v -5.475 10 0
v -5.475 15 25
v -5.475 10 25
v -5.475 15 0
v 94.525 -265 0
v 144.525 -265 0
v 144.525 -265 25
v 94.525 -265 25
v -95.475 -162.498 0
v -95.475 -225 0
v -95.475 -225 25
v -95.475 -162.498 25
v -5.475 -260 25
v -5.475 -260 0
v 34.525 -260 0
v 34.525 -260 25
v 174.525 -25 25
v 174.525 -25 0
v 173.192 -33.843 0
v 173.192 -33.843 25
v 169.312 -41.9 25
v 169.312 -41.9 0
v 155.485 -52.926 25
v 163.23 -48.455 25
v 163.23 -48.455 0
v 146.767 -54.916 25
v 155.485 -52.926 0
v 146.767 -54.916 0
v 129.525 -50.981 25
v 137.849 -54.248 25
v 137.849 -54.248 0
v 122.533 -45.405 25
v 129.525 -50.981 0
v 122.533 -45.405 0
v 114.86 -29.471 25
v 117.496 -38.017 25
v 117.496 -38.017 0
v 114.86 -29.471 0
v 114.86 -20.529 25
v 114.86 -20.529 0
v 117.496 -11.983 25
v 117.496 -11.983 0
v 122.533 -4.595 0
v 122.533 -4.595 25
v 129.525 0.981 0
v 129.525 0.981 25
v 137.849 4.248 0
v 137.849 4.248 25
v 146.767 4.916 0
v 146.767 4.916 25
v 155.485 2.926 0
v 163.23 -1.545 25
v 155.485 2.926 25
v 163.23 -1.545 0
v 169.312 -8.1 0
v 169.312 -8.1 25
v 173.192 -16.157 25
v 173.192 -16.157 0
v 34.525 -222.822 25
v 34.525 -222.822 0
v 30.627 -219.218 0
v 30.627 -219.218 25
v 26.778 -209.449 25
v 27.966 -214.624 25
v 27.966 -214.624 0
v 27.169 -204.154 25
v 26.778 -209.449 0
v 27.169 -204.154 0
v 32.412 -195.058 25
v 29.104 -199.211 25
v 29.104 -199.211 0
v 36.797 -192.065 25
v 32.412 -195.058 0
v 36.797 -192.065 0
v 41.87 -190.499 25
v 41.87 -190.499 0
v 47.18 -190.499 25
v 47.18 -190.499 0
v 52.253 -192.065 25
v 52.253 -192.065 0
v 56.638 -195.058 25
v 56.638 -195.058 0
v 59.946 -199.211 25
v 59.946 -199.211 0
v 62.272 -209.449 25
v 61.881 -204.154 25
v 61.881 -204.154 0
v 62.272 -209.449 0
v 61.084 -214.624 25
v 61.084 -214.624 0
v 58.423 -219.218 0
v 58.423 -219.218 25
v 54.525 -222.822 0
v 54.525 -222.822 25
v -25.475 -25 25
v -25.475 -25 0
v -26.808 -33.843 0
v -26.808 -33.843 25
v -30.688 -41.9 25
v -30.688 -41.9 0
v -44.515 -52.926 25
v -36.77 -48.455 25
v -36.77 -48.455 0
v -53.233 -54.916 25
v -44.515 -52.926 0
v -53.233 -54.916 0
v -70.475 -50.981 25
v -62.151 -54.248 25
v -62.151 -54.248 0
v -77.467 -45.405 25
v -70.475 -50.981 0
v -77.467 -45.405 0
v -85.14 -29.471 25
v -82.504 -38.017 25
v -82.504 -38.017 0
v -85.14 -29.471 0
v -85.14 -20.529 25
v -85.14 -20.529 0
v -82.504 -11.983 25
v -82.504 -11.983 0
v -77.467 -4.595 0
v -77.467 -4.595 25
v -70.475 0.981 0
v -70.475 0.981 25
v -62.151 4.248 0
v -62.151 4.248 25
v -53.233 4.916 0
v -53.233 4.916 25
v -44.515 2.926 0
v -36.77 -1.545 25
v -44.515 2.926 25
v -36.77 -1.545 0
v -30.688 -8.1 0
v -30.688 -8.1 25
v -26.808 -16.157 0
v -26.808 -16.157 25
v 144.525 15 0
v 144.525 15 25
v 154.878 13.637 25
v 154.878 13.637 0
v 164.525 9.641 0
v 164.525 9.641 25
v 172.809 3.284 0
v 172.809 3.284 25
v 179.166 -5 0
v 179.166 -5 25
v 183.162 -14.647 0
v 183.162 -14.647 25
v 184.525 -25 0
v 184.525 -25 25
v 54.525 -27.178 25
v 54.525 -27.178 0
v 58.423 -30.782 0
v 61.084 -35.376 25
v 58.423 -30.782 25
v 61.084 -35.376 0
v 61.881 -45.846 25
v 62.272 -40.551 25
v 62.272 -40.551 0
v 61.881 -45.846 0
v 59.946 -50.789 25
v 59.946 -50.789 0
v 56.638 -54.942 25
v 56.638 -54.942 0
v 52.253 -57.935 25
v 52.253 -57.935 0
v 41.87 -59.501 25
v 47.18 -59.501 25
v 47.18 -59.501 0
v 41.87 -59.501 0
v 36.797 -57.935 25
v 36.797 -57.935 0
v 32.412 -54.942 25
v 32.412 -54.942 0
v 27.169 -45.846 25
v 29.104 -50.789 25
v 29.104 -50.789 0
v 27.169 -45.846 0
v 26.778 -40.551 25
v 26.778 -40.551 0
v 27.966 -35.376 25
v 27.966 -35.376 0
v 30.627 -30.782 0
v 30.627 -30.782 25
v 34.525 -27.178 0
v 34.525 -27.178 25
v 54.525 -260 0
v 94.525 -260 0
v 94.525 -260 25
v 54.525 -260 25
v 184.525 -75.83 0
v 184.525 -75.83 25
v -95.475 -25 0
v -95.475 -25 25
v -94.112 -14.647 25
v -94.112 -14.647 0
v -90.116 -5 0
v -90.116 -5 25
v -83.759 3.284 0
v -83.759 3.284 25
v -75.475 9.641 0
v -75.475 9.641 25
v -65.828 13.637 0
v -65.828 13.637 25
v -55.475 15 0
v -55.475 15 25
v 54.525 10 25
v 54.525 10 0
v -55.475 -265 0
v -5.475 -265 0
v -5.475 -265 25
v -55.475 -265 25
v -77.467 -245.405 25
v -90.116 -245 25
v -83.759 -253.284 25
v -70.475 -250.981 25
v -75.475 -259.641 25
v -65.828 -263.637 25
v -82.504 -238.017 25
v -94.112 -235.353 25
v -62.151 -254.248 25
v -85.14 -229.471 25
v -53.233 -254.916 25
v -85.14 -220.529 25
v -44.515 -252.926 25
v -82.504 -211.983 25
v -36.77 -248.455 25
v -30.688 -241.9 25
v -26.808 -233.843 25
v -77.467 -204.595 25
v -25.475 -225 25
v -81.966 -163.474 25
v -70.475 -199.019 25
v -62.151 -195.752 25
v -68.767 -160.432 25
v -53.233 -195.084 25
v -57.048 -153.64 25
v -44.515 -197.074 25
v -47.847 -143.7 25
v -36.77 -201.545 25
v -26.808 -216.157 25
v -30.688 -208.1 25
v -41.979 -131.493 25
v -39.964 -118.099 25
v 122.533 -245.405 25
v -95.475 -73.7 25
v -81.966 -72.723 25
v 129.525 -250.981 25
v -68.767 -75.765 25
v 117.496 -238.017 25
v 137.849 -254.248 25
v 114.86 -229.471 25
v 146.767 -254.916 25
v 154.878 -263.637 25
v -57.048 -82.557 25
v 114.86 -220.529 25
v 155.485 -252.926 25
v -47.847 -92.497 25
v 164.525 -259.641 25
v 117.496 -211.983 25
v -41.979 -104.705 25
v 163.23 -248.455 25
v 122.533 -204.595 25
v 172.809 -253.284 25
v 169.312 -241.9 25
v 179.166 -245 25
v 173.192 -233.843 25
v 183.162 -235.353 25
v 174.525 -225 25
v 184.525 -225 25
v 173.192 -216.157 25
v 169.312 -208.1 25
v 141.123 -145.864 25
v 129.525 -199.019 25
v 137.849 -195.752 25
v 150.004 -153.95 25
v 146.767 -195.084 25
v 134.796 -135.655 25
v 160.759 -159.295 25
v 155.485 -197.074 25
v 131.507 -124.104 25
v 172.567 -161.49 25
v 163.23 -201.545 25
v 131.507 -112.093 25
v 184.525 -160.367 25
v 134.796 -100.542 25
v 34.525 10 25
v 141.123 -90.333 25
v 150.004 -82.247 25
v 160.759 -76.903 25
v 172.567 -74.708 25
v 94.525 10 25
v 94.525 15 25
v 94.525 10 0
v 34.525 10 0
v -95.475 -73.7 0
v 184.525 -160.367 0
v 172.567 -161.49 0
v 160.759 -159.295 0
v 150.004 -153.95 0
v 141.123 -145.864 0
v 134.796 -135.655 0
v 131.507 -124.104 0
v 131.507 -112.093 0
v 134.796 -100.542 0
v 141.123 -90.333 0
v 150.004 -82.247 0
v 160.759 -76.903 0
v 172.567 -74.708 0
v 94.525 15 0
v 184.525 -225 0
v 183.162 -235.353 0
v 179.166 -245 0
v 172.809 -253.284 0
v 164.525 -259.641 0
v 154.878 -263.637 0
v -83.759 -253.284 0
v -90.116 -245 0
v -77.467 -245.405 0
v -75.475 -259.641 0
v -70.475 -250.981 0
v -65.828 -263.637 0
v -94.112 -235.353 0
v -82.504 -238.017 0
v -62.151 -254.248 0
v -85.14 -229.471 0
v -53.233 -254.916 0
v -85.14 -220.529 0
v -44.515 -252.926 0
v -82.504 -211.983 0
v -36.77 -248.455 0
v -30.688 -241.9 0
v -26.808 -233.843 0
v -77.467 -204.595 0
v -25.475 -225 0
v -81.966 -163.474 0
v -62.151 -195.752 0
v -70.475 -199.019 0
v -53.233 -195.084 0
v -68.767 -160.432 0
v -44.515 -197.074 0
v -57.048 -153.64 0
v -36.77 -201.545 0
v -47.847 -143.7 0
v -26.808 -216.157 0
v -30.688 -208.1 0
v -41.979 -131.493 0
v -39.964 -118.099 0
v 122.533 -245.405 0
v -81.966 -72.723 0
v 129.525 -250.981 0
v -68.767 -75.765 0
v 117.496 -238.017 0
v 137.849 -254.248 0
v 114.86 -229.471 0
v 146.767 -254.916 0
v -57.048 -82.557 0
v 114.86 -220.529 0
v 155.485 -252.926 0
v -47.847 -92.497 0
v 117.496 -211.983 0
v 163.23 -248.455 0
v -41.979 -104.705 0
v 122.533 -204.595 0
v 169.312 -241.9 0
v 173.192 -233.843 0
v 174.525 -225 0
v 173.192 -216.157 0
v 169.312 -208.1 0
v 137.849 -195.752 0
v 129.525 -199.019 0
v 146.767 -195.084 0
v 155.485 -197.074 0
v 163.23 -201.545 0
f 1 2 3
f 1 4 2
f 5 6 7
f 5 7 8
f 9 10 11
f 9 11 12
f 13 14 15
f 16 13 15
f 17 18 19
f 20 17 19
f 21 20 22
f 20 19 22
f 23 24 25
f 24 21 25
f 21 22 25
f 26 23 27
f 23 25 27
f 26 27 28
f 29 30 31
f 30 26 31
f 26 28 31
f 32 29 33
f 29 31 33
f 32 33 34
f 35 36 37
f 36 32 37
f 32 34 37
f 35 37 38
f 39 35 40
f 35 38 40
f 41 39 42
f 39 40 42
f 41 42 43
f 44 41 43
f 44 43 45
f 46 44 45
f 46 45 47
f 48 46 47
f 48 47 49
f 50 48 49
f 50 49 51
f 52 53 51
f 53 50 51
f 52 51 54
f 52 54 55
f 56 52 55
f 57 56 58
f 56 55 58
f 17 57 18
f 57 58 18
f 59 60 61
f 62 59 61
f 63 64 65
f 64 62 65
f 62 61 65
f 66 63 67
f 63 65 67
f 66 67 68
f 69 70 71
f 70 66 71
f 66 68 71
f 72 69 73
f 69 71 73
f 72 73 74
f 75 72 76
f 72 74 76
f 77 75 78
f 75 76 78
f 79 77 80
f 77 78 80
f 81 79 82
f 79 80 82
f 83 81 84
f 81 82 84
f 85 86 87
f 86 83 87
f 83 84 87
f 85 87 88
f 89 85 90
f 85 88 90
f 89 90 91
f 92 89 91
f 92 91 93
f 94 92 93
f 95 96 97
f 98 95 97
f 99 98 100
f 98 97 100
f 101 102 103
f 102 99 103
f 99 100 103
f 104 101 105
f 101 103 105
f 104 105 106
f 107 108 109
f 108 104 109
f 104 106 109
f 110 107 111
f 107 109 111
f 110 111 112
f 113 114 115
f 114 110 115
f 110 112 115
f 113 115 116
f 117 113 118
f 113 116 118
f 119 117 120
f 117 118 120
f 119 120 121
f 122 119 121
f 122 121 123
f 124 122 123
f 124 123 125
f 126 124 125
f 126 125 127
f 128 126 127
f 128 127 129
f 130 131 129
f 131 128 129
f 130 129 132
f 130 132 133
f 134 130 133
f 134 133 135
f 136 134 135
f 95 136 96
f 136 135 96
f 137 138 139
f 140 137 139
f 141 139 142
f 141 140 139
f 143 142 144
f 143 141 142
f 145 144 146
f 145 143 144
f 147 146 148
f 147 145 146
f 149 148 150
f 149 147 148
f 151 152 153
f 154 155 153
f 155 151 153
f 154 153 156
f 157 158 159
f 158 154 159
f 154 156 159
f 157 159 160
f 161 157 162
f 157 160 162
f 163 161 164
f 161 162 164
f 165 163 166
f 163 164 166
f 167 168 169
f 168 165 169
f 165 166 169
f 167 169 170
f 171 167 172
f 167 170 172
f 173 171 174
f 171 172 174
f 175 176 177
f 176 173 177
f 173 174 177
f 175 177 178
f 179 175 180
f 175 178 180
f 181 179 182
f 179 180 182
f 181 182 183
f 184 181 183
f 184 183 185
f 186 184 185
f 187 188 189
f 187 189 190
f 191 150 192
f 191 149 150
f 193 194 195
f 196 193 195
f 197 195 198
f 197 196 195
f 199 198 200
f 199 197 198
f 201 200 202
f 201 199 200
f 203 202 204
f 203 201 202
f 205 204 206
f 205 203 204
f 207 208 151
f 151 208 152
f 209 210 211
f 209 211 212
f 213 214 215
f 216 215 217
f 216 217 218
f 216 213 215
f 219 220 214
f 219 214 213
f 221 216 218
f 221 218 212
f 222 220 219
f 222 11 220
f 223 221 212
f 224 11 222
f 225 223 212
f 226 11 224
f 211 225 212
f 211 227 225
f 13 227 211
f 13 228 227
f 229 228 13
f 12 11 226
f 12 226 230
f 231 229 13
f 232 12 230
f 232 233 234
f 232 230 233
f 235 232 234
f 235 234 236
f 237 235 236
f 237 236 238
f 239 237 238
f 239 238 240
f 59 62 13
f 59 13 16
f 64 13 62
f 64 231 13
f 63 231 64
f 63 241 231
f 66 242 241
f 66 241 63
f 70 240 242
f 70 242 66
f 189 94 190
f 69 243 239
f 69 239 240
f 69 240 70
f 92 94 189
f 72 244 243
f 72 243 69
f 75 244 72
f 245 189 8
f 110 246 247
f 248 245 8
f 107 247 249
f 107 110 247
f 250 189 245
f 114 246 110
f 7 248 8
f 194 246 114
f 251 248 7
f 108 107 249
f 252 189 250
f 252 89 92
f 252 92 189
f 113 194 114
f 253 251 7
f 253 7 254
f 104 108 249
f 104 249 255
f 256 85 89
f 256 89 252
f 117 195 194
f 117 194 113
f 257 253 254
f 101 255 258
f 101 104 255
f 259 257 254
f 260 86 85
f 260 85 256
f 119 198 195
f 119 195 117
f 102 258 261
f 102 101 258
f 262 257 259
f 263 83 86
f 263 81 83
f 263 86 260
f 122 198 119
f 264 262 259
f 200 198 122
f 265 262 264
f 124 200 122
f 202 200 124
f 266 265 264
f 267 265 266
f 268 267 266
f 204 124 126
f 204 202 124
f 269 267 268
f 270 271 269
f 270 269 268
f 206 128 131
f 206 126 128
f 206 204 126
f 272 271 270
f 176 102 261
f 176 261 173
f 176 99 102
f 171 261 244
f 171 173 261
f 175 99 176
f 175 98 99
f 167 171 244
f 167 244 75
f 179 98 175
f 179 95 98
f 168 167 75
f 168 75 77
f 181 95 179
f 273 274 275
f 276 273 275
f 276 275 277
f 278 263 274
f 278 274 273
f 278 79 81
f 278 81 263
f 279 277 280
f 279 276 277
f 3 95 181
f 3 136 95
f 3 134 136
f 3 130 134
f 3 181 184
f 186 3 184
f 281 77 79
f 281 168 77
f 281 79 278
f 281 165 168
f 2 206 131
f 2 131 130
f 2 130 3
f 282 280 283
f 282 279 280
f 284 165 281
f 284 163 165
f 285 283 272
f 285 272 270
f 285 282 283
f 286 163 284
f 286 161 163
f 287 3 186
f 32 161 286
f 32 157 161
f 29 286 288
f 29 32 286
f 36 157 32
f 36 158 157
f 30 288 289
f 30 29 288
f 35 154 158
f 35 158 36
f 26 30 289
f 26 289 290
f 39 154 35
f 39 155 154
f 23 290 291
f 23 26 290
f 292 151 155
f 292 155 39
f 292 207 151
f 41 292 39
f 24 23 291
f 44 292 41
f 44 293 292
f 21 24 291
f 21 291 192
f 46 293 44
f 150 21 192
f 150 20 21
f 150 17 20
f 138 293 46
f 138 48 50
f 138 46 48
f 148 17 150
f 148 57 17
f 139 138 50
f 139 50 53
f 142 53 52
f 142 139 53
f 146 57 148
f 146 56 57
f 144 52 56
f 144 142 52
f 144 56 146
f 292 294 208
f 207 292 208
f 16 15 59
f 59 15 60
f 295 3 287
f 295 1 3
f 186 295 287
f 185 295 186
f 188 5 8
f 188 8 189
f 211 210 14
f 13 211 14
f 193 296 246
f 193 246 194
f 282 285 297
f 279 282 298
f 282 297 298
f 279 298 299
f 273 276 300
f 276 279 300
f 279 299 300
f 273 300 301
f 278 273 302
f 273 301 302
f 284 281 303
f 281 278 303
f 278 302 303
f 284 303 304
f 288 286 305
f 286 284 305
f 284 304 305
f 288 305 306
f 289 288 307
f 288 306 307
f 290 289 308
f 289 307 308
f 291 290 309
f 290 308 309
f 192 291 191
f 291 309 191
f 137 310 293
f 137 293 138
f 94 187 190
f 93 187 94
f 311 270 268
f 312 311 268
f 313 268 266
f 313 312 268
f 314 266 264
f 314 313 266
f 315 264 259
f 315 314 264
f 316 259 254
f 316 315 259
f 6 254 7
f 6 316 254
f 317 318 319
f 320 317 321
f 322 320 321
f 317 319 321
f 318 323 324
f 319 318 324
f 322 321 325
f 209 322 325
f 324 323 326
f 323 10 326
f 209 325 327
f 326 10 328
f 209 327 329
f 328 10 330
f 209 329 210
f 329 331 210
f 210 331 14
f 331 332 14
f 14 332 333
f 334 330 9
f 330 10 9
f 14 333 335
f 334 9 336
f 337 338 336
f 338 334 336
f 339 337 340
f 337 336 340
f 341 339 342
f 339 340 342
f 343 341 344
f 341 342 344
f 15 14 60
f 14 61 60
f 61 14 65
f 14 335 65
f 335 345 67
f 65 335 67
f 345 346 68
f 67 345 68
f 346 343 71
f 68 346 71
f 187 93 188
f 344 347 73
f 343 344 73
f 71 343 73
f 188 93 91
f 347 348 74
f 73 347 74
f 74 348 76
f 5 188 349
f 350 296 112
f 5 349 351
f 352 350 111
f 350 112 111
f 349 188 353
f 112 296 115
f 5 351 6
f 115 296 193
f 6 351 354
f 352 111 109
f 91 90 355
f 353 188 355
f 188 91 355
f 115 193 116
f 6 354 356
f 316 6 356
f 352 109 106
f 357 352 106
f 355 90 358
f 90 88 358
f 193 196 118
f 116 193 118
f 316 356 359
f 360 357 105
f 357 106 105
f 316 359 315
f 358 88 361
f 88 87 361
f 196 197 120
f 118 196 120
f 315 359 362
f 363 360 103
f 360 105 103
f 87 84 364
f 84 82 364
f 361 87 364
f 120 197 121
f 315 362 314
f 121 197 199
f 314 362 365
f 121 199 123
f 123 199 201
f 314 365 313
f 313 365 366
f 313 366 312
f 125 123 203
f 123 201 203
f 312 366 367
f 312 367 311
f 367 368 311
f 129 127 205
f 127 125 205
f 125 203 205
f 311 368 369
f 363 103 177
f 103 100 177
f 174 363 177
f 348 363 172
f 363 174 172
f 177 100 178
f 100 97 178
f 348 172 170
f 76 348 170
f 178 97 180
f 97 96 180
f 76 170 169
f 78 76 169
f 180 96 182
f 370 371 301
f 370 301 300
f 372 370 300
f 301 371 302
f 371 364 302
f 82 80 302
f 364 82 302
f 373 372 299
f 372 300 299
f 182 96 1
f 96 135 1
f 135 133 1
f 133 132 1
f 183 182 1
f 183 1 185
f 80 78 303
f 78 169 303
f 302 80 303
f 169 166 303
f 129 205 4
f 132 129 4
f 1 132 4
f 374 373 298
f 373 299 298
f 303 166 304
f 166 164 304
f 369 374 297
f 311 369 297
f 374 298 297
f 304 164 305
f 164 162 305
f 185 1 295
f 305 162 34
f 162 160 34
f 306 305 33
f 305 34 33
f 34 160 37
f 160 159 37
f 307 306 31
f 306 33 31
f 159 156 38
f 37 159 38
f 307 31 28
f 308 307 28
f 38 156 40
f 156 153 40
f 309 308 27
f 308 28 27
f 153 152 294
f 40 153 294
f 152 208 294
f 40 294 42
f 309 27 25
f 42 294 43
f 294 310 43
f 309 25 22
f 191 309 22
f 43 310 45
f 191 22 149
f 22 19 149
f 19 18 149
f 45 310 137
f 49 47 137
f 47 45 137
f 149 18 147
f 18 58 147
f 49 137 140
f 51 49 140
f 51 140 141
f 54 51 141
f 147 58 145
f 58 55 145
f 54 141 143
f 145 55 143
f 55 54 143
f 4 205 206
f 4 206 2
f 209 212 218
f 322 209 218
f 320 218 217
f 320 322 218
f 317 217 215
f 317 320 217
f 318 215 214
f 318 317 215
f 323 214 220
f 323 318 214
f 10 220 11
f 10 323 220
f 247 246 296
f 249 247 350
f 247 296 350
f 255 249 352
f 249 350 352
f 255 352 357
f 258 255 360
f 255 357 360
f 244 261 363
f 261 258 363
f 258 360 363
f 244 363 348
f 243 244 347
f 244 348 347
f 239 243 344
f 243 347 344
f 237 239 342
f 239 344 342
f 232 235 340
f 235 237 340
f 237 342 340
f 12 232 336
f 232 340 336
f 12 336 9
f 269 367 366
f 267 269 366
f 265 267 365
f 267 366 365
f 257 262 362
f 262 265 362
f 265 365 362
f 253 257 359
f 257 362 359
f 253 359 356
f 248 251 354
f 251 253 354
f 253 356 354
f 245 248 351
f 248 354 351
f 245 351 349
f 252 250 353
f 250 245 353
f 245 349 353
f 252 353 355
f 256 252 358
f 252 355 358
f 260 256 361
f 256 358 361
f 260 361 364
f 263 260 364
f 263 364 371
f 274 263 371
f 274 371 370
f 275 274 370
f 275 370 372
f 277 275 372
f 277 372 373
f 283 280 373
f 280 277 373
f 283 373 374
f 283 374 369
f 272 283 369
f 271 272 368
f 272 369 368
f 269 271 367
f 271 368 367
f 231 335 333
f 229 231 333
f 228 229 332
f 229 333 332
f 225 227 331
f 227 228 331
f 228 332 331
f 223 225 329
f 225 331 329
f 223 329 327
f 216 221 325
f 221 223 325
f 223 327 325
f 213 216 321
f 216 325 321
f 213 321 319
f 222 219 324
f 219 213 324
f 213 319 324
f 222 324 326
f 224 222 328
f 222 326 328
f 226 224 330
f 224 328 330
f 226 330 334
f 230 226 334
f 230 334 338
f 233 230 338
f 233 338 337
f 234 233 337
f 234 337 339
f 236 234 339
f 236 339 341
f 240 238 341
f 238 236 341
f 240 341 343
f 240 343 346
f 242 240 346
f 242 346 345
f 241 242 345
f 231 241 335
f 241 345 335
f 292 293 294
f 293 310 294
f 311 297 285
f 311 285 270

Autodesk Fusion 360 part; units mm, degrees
sketch "Sketch1" plane through (0, 0, 0) normal (0, 0, 1) x (1, 0, 0)
  circle A0 centre (-55.475, -25) radius 30
  circle A1 centre (144.525, -25) radius 30
  circle A2 centre (144.525, -225) radius 30
  circle A3 centre (-55.475, -225) radius 30
  line L0 (-55.475, 15) -> (144.525, 15)
  line L1 (144.525, -265) -> (-55.475, -265)
  line L2 (-95.475, 15) -> (184.525, -265) construction
  line L3 (184.525, 15) -> (-95.475, -265) construction
  line L4 (184.525, -25) -> (184.525, -75.8302)
  line L5 (184.525, -160.367) -> (184.525, -225)
  arc A4 (184.525, -75.8302) -> (184.525, -160.367) centre (174.525, -118.0986) ccw
  line L6 (-95.475, -225) -> (-95.475, -162.4976)
  line L7 (-95.475, -73.6997) -> (-95.475, -25)
  arc A5 (-95.475, -162.4976) -> (-95.475, -73.6997) centre (-85.475, -118.0986) ccw
  arc A6 (-55.475, 15) -> (-95.475, -25) centre (-55.475, -25) ccw
  arc A7 (184.525, -25) -> (144.525, 15) centre (144.525, -25) ccw
  arc A8 (144.525, -265) -> (184.525, -225) centre (144.525, -225) ccw
  arc A9 (-95.475, -225) -> (-55.475, -265) centre (-55.475, -225) ccw
  line L8 (-5.475, -265) -> (-5.475, -260)
  line L9 (94.525, -265) -> (94.525, -260)
  line L10 (-5.475, -260) -> (34.525, -260)
  line L11 (94.525, -260) -> (54.525, -260)
  line L12 (34.525, -260) -> (34.525, -222.8224)
  line L13 (54.525, -260) -> (54.525, -222.8224)
  arc A10 (54.525, -222.8224) -> (34.525, -222.8224) centre (44.525, -208.0986) ccw
  line L14 (34.525, 10) -> (34.525, -27.1776)
  arc A11 (34.525, -27.1776) -> (54.525, -27.1776) centre (44.525, -41.9014) ccw
  line L15 (54.525, 10) -> (54.525, -27.1776)
  line L16 (-5.475, 10) -> (34.525, 10)
  line L17 (94.525, 10) -> (54.525, 10)
  line L18 (-5.475, 15) -> (-5.475, 10)
  line L19 (94.525, 15) -> (94.525, 10)
  point P0 (44.525, -125)
  dimension "d1" = 60
  dimension "d2" = 60
  dimension "d3" = 200
  dimension "d4" = 200
  dimension "d5" = 200
  dimension "d8" = 260
  dimension "d9" = 280
  dimension "d10" = 280
  dimension "d11" = 40
  dimension "d12" = 40
  dimension "d13" = 40
  dimension "d14" = 40
  dimension "d15" = 40
  dimension "d16" = 40
  dimension "d17" = 40
  dimension "d18" = 100
  dimension "d19" = 50
  dimension "d20" = 5
  dimension "d21" = 5
  dimension "d22" = 40
  dimension "d23" = 40
extrude "Extrude1" add sketch "Sketch1" along normal blind 25 contours L0 L1 L4 L5 A4 L6 L7 A5 A6 A7 A8 A9 L8 L9 L10 L11 L12 L13 A10 L14 A11 L15 L16 L17 L18 L19
